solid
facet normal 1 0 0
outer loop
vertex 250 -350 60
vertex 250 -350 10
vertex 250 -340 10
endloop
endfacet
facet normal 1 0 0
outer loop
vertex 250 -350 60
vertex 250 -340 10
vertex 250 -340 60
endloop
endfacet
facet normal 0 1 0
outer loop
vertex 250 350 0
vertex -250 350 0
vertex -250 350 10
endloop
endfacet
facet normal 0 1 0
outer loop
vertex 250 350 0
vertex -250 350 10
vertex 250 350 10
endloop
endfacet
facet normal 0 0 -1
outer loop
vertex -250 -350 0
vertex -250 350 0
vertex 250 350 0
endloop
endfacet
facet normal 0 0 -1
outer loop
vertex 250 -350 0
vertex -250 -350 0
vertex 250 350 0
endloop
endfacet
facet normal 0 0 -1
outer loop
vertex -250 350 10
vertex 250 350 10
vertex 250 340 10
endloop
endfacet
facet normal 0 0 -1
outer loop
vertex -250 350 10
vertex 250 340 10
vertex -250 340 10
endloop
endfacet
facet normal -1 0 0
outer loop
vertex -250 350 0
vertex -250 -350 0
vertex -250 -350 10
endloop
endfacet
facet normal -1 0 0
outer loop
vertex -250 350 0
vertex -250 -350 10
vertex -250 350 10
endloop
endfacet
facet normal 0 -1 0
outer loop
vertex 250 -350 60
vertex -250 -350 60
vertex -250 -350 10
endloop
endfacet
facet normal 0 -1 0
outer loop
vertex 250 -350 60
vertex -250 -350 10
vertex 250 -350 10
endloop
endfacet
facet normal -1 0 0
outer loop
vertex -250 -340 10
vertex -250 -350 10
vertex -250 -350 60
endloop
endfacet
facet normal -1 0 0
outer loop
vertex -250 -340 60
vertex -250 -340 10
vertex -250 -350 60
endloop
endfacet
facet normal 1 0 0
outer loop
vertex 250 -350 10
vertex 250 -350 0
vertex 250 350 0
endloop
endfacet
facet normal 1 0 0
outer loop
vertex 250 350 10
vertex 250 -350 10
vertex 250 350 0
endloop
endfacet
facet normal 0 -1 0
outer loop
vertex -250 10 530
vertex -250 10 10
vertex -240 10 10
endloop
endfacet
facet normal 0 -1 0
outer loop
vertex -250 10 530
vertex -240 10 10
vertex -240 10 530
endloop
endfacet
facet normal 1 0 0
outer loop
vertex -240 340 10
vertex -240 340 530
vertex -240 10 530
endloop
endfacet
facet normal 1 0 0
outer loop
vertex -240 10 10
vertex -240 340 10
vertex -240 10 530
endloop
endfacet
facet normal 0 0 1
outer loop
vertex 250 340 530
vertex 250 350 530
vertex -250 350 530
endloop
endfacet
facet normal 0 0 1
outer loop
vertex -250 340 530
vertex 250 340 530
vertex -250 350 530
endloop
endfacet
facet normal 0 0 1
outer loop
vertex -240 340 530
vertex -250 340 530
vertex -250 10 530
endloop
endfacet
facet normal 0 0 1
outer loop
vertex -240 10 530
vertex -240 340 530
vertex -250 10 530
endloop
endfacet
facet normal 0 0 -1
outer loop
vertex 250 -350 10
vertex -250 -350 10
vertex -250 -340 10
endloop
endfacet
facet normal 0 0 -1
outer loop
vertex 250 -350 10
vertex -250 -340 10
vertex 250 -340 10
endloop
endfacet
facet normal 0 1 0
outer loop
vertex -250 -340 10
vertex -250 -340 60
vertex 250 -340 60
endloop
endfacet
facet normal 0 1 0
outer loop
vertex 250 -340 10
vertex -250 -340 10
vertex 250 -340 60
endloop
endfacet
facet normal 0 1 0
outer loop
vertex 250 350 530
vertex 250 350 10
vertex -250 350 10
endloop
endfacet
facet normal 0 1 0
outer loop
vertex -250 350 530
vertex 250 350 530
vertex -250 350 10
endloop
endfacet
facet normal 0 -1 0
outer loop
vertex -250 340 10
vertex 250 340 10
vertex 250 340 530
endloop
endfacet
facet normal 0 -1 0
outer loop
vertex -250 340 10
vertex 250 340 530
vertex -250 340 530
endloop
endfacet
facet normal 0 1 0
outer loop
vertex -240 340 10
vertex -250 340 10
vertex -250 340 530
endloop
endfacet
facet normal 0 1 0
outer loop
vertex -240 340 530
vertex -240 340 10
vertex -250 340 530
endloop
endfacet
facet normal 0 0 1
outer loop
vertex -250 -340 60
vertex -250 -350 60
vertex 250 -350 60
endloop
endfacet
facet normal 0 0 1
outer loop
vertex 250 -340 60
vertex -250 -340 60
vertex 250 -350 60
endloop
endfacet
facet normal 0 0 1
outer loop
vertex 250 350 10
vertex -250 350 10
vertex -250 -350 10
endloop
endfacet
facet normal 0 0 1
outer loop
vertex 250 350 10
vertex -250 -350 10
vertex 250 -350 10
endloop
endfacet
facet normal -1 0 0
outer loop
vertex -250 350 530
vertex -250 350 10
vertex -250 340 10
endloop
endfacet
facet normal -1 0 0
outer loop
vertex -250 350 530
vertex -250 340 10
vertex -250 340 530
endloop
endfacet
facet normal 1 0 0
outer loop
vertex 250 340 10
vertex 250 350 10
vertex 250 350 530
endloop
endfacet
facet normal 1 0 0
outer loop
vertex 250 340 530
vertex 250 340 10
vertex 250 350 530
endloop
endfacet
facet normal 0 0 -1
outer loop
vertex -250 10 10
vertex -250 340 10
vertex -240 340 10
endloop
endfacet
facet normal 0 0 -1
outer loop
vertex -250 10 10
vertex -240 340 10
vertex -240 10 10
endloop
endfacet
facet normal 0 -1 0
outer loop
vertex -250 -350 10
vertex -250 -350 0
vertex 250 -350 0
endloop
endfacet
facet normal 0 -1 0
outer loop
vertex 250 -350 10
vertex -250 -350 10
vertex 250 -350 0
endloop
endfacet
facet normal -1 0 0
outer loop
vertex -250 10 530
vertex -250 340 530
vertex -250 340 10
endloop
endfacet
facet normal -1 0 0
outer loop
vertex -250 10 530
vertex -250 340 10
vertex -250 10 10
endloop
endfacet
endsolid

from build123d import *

# Parameters (mm, degrees)
F1_W     = 500
F1_H     = 700
F2_DEPTH = 10
F3_W     = 500
F3_H     = 520
F4_DEPTH = 10
F5_W     = 330
F5_H     = 520
F6_DEPTH = 10
F7_W     = 500
F7_H     = 50
F8_DEPTH = 10


with BuildPart() as f2:
    # F1 (on Top) → F2 (new body)
    with BuildSketch(Plane.XY):
        Rectangle(F1_W, F1_H)
    extrude(amount=F2_DEPTH)


with BuildPart() as f4:
    # F3 (on face) → F4 (new body)
    with BuildSketch(Plane(origin=(0, 350, 0), x_dir=(-1, 0, 0), z_dir=(0, 1, 0))):
        with Locations((0, 270)):
            Rectangle(F3_W, F3_H)
    extrude(amount=-F4_DEPTH)


with BuildPart() as f6:
    # F5 (on face) → F6 (new body)
    with BuildSketch(Plane(origin=(-250, 0, 0), x_dir=(0, -1, 0), z_dir=(-1, 0, 0))):
        with Locations((-175, 270)):
            Rectangle(F5_W, F5_H)
    extrude(amount=-F6_DEPTH)


with BuildPart() as f8:
    # F7 (on face) → F8 (new body)
    with BuildSketch(Plane.XZ.offset(350)):
        with Locations((0, 35)):
            Rectangle(F7_W, F7_H)
    extrude(amount=-F8_DEPTH)


solid = Compound([f2.part, f4.part, f6.part, f8.part])
